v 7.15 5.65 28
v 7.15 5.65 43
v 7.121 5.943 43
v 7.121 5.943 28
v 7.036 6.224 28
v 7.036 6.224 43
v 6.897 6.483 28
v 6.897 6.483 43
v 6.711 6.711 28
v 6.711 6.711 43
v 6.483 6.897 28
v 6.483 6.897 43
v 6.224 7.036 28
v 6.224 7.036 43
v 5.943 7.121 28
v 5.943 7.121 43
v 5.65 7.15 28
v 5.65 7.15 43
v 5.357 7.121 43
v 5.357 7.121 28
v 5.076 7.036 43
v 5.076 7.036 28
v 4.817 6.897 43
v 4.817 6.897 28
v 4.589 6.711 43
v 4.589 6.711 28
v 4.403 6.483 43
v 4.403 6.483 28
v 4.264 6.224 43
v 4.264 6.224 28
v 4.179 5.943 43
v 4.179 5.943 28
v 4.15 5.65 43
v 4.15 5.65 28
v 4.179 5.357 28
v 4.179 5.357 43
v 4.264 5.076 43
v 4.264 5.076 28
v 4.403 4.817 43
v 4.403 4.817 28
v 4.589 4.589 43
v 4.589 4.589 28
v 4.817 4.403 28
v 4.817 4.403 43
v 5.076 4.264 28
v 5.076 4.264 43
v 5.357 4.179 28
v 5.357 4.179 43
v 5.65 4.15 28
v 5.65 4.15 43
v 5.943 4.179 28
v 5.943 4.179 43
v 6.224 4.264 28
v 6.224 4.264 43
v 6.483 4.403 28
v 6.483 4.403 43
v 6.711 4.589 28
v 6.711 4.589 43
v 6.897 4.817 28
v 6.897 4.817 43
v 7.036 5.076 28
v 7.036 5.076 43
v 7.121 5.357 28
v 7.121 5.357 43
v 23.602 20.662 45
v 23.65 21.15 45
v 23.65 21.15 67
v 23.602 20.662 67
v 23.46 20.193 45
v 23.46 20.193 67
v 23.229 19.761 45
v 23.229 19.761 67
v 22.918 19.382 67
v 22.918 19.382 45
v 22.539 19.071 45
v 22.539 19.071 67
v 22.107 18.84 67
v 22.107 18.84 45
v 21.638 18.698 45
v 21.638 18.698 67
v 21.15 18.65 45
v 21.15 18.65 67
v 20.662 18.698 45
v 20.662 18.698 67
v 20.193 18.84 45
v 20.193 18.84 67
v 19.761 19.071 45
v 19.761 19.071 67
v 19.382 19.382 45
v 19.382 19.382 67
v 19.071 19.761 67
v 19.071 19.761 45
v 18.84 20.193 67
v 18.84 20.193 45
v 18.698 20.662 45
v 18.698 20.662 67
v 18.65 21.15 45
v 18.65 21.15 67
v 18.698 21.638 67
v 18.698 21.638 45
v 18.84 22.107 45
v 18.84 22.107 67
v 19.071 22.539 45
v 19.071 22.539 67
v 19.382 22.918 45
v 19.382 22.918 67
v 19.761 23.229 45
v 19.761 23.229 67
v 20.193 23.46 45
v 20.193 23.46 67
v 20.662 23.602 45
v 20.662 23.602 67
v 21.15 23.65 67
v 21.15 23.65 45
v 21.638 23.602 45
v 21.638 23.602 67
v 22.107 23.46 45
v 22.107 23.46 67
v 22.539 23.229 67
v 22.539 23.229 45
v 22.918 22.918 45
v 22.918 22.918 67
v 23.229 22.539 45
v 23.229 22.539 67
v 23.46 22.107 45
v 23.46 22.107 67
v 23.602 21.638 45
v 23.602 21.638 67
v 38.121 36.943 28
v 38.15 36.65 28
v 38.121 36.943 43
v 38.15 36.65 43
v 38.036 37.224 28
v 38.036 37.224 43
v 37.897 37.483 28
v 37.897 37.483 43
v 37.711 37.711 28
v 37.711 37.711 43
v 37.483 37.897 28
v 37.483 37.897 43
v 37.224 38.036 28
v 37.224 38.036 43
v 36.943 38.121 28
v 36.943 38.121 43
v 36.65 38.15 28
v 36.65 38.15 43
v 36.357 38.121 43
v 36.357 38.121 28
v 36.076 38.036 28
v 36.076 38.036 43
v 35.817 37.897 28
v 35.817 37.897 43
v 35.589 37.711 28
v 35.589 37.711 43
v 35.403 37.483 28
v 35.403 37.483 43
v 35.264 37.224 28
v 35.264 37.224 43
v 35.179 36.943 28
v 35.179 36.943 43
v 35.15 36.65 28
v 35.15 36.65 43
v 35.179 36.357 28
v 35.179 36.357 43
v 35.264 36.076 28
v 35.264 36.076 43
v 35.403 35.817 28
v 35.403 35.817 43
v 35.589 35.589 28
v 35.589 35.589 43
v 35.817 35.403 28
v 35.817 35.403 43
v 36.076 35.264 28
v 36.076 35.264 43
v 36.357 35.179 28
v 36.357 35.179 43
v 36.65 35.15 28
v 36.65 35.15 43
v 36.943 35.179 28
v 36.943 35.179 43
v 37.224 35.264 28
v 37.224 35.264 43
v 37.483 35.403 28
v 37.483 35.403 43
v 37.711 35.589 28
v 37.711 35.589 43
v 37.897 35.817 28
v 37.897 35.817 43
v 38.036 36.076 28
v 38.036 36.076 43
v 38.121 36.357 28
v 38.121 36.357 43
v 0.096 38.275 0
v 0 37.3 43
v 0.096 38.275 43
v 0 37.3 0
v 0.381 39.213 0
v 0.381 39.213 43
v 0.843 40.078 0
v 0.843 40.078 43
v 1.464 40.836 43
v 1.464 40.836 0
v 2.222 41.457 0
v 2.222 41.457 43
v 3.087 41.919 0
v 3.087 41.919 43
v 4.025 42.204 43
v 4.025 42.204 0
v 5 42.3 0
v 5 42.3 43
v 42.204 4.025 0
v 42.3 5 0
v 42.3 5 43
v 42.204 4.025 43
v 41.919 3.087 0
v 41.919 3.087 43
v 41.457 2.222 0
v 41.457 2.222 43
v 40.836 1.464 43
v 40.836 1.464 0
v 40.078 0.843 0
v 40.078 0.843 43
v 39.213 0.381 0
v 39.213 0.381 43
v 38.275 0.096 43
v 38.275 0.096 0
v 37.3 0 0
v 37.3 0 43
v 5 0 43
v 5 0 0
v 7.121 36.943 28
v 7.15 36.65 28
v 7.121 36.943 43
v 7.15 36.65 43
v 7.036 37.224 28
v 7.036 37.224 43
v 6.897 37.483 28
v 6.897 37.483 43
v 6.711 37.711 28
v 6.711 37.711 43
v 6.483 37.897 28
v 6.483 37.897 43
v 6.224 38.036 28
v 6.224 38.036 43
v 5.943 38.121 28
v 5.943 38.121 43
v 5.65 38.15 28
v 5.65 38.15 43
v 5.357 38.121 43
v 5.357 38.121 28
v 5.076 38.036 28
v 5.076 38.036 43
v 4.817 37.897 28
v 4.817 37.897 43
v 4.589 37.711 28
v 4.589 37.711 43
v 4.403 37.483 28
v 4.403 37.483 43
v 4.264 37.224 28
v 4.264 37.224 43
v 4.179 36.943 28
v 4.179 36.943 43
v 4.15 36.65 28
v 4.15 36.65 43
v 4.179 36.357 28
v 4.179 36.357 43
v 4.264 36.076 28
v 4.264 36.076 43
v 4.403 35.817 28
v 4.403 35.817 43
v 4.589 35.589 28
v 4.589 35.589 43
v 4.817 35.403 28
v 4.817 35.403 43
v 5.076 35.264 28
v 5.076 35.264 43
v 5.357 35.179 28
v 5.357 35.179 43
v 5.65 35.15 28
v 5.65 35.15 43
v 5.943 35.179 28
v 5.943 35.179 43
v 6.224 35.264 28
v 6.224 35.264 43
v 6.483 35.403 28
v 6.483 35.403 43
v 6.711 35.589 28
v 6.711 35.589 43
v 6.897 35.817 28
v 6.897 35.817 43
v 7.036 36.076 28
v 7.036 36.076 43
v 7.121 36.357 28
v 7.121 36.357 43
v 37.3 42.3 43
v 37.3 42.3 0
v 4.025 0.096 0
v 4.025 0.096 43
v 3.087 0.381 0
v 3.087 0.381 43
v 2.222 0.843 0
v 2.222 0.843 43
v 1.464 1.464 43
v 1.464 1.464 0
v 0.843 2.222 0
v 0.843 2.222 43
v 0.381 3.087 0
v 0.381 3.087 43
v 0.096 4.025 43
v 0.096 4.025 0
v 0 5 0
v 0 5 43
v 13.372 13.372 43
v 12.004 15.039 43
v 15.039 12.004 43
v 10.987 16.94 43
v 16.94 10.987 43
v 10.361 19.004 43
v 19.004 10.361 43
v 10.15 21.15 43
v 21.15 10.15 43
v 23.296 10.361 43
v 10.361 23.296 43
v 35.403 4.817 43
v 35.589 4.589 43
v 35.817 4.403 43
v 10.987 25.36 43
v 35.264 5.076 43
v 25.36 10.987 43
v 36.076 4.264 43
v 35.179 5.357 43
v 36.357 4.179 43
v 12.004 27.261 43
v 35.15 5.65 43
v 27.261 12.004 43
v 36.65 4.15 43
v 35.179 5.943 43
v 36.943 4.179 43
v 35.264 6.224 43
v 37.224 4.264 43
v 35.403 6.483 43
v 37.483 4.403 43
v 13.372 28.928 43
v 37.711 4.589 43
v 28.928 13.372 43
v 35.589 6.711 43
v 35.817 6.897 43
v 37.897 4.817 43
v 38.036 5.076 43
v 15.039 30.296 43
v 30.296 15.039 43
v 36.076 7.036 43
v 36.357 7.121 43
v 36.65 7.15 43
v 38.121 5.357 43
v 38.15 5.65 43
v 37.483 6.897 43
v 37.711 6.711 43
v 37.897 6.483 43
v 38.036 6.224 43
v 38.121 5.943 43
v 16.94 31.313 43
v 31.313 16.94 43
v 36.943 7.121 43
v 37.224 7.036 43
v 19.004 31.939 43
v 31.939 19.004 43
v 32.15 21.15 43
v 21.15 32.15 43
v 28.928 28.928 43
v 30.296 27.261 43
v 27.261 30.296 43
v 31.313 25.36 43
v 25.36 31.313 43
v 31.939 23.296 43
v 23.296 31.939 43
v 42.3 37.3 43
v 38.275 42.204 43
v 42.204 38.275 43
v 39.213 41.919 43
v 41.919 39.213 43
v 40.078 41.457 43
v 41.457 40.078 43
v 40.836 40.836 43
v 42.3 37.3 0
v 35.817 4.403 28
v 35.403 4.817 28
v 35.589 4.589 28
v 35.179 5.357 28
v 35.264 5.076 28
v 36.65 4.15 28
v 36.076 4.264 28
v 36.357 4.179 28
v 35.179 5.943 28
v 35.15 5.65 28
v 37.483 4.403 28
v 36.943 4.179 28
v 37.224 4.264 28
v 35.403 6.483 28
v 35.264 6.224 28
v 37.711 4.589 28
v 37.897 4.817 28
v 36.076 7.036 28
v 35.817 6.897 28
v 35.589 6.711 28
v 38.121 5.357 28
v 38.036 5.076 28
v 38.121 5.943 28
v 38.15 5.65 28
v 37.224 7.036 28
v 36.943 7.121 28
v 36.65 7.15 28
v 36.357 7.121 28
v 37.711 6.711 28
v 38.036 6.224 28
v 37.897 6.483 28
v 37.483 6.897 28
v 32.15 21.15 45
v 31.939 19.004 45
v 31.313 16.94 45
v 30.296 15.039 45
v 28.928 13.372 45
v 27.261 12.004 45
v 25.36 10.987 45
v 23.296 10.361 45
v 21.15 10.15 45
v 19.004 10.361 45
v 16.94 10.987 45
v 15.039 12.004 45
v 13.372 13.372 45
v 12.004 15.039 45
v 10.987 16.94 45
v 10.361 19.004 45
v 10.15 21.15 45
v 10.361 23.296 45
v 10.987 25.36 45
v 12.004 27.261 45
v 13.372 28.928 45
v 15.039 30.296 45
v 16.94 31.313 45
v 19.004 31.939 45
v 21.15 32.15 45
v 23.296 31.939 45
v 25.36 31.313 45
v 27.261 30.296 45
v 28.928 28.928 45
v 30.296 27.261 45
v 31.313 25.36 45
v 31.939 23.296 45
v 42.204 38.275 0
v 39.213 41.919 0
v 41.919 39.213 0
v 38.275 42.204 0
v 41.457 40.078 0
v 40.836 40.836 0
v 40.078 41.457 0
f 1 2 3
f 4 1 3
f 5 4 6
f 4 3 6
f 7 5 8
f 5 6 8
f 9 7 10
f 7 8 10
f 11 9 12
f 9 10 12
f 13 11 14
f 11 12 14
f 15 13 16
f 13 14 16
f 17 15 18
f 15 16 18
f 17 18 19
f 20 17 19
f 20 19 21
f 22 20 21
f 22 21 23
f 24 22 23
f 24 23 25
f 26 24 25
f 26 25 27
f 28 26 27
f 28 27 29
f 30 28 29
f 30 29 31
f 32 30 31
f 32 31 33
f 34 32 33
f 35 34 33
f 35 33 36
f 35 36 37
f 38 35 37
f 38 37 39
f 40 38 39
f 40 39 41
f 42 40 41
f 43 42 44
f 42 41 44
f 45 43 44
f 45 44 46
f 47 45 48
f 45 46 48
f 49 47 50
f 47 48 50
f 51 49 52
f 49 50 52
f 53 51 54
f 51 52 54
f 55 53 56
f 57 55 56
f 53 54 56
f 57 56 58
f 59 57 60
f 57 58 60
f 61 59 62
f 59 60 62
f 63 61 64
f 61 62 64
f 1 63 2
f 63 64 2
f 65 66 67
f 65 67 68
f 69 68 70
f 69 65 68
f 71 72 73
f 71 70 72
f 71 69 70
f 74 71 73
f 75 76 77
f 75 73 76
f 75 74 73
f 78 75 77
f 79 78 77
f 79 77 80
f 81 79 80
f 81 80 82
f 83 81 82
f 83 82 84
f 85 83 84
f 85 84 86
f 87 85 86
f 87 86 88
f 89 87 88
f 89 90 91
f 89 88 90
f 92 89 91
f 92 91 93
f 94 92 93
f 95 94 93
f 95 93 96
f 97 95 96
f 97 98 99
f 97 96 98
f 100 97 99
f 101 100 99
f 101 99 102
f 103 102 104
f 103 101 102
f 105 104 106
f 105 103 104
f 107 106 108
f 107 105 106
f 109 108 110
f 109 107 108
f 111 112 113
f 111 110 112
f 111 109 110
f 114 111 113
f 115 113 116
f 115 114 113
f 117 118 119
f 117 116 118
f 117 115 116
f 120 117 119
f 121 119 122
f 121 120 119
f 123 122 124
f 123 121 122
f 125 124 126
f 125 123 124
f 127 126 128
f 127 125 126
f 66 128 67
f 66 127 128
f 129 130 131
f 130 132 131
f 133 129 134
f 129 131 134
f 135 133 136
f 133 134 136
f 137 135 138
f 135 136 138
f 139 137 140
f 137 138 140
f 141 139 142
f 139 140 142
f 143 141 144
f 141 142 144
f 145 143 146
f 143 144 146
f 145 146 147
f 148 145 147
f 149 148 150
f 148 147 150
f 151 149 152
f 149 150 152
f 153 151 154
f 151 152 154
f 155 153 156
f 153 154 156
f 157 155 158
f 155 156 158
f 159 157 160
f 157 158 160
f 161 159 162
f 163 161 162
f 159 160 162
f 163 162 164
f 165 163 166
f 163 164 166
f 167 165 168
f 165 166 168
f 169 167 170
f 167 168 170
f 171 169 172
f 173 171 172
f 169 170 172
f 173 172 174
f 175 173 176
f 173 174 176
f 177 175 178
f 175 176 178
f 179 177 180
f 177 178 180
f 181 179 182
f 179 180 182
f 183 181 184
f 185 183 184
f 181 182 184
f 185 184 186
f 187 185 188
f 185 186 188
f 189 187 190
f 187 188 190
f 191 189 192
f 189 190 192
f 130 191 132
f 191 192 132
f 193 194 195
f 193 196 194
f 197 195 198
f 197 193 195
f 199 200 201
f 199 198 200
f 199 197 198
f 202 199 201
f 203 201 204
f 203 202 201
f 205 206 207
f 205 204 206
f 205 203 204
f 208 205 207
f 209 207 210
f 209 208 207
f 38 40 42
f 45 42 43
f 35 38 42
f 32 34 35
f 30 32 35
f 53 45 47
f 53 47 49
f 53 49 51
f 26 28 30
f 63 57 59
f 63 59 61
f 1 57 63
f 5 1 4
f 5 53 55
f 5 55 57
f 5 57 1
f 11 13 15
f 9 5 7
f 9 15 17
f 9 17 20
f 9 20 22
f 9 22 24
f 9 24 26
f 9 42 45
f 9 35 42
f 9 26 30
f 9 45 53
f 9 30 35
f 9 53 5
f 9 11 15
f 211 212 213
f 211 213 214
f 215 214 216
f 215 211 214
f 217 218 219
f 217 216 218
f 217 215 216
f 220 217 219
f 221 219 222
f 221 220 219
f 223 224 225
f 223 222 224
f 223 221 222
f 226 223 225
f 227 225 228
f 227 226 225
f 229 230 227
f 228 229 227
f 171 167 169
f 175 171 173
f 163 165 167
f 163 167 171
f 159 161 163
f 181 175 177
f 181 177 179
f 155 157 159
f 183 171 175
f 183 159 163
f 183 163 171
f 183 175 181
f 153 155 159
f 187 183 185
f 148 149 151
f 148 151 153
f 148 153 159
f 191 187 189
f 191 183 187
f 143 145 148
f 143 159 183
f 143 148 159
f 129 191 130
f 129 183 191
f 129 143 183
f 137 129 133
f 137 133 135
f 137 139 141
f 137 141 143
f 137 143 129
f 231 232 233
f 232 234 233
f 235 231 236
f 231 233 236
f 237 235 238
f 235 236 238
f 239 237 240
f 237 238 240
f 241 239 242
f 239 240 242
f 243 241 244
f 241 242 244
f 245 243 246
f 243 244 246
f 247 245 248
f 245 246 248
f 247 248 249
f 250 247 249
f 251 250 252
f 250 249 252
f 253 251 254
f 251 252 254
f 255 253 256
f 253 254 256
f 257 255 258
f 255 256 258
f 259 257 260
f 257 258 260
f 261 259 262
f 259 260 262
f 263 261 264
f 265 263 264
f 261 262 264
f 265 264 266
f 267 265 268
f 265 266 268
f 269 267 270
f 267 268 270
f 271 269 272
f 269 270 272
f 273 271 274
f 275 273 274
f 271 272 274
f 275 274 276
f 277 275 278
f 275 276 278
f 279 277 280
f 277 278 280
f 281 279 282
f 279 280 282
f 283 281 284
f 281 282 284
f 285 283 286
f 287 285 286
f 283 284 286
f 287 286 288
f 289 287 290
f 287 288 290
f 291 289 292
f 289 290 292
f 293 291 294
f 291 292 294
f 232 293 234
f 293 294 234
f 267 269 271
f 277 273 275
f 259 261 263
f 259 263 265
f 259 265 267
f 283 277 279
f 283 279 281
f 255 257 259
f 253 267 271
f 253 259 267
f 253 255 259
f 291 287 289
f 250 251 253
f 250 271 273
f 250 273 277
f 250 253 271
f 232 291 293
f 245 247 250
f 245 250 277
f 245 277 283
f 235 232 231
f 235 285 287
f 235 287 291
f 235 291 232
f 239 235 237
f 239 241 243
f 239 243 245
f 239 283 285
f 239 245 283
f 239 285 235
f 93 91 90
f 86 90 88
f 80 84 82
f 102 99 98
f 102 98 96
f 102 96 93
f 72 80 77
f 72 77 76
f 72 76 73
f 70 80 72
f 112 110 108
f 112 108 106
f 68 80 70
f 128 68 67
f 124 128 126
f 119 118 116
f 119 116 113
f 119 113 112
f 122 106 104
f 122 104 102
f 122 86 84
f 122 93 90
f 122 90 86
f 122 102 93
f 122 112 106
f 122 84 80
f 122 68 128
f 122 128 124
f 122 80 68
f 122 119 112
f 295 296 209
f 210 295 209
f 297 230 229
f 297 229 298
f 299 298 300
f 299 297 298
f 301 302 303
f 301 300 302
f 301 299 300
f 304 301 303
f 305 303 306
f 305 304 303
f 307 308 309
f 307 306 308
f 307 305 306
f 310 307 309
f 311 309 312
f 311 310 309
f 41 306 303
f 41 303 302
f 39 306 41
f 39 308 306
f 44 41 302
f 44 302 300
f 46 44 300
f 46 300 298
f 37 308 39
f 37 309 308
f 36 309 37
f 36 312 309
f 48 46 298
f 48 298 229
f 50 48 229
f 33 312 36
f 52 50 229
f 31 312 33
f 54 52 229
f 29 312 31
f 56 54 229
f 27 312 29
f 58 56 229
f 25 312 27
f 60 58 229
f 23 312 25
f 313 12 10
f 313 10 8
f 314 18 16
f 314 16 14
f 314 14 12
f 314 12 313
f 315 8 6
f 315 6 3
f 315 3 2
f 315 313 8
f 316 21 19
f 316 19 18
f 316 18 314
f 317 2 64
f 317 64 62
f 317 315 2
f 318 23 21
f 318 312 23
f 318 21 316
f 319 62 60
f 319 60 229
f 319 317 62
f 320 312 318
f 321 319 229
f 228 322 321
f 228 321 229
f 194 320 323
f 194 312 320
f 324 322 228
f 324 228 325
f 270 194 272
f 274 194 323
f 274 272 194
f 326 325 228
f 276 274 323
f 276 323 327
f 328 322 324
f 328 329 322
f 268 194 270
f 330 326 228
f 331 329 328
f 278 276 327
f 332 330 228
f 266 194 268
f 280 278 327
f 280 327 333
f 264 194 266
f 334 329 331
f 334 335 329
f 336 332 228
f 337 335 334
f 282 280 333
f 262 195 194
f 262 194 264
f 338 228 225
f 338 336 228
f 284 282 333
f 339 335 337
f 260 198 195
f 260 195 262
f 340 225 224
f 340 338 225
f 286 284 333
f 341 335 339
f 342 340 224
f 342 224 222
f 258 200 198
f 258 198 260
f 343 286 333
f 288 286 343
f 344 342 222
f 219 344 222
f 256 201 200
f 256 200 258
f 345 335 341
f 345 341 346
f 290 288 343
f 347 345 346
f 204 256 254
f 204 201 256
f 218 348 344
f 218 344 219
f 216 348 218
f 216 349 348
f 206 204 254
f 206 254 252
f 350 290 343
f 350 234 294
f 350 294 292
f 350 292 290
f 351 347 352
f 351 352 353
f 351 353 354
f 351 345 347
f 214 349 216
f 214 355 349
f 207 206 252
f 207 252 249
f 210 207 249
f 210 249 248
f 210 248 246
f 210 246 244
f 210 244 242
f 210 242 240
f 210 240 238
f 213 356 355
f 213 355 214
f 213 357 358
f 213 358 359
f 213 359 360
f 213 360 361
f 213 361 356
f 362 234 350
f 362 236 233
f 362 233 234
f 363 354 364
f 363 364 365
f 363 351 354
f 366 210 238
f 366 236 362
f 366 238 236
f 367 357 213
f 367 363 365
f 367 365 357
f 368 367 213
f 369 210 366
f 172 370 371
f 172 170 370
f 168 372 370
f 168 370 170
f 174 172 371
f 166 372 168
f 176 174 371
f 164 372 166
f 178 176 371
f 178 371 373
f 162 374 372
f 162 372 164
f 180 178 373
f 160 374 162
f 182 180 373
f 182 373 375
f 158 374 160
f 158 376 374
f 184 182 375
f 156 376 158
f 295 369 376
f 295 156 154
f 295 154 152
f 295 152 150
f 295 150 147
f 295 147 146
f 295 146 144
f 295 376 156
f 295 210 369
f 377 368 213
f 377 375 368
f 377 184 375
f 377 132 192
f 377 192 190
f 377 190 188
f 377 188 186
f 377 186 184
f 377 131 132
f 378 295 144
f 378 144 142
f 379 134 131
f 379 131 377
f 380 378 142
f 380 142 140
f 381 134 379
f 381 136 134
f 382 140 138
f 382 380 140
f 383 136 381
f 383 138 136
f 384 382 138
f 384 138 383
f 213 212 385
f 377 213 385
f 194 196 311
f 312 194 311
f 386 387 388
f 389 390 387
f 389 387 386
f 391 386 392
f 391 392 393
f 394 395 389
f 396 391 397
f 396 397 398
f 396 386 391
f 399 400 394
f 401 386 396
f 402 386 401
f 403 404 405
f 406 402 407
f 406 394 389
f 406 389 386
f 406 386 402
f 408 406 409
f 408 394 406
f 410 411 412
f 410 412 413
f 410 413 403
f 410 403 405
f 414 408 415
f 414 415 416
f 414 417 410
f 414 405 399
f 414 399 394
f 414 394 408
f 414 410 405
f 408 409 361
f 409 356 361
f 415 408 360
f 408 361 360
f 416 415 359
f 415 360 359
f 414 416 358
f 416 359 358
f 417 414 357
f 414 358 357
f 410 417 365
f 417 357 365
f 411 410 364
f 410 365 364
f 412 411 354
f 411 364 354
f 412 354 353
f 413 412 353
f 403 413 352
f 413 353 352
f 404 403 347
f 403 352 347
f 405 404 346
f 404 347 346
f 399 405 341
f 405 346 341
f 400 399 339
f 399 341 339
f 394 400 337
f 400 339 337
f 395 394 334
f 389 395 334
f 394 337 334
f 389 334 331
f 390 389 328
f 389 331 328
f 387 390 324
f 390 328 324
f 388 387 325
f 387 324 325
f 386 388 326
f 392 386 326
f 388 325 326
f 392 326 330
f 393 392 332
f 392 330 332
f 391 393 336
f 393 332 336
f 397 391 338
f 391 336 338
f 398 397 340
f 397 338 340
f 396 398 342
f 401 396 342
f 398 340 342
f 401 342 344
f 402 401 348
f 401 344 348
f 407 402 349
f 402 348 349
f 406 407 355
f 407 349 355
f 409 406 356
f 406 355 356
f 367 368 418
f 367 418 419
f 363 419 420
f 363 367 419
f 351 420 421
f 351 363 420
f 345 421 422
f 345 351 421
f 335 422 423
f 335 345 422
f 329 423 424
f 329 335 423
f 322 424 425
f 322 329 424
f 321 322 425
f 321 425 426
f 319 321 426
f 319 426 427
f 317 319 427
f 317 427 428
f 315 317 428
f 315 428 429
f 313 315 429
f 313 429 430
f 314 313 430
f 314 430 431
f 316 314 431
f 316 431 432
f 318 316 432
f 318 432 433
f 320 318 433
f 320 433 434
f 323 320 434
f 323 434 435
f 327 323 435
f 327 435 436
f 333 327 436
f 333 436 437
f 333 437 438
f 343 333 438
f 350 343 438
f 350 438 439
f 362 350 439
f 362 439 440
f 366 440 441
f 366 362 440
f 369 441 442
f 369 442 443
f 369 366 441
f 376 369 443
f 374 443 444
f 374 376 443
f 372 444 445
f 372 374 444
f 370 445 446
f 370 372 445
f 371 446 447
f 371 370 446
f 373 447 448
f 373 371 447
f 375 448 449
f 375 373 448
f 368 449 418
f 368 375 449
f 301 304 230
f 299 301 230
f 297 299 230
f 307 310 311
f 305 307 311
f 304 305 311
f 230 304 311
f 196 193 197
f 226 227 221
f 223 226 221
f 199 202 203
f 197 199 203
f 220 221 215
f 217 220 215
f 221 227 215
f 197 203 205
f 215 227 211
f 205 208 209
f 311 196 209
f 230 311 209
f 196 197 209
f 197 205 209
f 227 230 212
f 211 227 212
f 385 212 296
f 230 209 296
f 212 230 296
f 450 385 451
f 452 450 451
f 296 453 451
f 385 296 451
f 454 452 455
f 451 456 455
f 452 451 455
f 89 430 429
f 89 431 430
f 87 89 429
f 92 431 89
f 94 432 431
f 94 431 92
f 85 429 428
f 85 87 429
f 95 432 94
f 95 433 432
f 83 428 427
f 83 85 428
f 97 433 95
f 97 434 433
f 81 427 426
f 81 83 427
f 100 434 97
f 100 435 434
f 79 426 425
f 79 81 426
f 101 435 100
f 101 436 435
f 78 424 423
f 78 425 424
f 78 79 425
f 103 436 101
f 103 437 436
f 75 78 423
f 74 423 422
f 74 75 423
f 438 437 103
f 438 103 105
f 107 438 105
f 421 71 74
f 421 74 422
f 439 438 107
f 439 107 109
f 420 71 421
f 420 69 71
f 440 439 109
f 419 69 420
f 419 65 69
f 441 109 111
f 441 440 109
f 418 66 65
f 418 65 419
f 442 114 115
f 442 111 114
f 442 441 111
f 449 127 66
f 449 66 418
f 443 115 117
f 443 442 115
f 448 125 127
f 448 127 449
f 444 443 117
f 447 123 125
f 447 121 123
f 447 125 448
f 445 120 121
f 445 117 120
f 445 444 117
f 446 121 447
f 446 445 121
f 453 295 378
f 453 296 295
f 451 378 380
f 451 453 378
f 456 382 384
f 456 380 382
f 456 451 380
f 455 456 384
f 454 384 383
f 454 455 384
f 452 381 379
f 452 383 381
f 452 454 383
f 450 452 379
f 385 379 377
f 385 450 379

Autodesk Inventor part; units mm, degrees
ref_plane "YZ Plane" through (0, 0, 0) normal (1, 0, 0) x (0, 1, 0)
ref_plane "XZ Plane" through (0, 0, 0) normal (0, 1, 0) x (-1, 0, 0)
ref_plane "XY Plane" through (0, 0, 0) normal (0, 0, 1) x (1, 0, 0)
sketch "Sketch1" plane through (0, 0, 0) normal (0, 0, 1) x (1, 0, 0)
  line L0 (5, 0) -> (37.3, 0)
  line L1 (42.3, 5) -> (42.3, 37.3)
  line L2 (37.3, 42.3) -> (5, 42.3)
  line L3 (0, 37.3) -> (0, 5)
  arc A0 (5, 42.3) -> (0, 37.3) centre (5, 37.3) ccw
  arc A1 (42.3, 37.3) -> (37.3, 42.3) centre (37.3, 37.3) ccw
  arc A2 (37.3, 0) -> (42.3, 5) centre (37.3, 5) ccw
  arc A3 (0, 5) -> (5, 0) centre (5, 5) ccw
  point P0 (0, 0)
  dimension "d0" = 42.3
  dimension "d1" = 42.3
  dimension "d2" = 5
extrude "Extrusion1" add sketch "Sketch1" along normal blind 43
sketch "Sketch2" plane through (0, 0, 43) normal (0, 0, 1) x (1, 0, 0)
  line L0 (0, 37.3) -> (0, 5) projected
  line L1 (5, 0) -> (37.3, 0) projected
  line L2 (37.3, 42.3) -> (5, 42.3) projected
  circle A0 centre (5.65, 36.65) radius 1.5
  circle A1 centre (36.65, 36.65) radius 1.5
  circle A2 centre (36.65, 5.65) radius 1.5
  circle A3 centre (5.65, 5.65) radius 1.5
  line L3 (5.65, 5.65) -> (21.15, 21.15)
  line L4 (36.65, 5.65) -> (21.15, 21.15)
  line L5 (21.15, 21.15) -> (36.65, 36.65)
  line L6 (21.15, 21.15) -> (5.65, 36.65)
  line L7 (5.65, 36.65) -> (36.65, 36.65)
  line L8 (5.65, 36.65) -> (5.65, 5.65)
  line L9 (21.15, 21.15) -> (21.15, 0)
  line L10 (0, 21.15) -> (21.15, 21.15)
  point P0 (0, 0)
  dimension "d5" = 31
  dimension "d8" = 3
  dimension "d10" = 21.15
  dimension "d11" = 21.15
extrude "Extrusion2" cut sketch "Sketch2" against normal blind 15 contours L7 L8 A0 | A0 L6 L7 | A2 | L8 L6 A0 | L7 L5 A1 | A1 L5 L7 | L8 L3 A3 | A3 L3 L8
sketch "Sketch3" plane through (0, 0, 43) normal (0, 0, 1) x (1, 0, 0)
  line L0 (0, 37.3) -> (0, 5) projected
  line L1 (5, 0) -> (37.3, 0) projected
  line L2 (37.3, 42.3) -> (5, 42.3) projected
  circle A0 centre (21.15, 21.15) radius 11
  line L3 (0, 21.15) -> (21.15, 21.15)
  line L4 (21.15, 21.15) -> (21.15, 0)
  point P0 (0, 0)
  dimension "d14" = 22
extrude "Extrusion3" add sketch "Sketch3" along normal blind 2
sketch "Sketch4" plane through (21.15, 21.15, 45) normal (0, 0, 1) x (1, 0, 0)
  circle A0 centre (0, 0) radius 11 projected
  circle A1 centre (0, 0) radius 2.5
  point P0 (-21.15, -21.15)
  dimension "d19" = 5
extrude "Extrusion4" add sketch "Sketch4" along normal blind 22 contours A1
equation "\"d1\" = d0"
equation "\"d10\" = d11"
properties part number "NEMA17"
